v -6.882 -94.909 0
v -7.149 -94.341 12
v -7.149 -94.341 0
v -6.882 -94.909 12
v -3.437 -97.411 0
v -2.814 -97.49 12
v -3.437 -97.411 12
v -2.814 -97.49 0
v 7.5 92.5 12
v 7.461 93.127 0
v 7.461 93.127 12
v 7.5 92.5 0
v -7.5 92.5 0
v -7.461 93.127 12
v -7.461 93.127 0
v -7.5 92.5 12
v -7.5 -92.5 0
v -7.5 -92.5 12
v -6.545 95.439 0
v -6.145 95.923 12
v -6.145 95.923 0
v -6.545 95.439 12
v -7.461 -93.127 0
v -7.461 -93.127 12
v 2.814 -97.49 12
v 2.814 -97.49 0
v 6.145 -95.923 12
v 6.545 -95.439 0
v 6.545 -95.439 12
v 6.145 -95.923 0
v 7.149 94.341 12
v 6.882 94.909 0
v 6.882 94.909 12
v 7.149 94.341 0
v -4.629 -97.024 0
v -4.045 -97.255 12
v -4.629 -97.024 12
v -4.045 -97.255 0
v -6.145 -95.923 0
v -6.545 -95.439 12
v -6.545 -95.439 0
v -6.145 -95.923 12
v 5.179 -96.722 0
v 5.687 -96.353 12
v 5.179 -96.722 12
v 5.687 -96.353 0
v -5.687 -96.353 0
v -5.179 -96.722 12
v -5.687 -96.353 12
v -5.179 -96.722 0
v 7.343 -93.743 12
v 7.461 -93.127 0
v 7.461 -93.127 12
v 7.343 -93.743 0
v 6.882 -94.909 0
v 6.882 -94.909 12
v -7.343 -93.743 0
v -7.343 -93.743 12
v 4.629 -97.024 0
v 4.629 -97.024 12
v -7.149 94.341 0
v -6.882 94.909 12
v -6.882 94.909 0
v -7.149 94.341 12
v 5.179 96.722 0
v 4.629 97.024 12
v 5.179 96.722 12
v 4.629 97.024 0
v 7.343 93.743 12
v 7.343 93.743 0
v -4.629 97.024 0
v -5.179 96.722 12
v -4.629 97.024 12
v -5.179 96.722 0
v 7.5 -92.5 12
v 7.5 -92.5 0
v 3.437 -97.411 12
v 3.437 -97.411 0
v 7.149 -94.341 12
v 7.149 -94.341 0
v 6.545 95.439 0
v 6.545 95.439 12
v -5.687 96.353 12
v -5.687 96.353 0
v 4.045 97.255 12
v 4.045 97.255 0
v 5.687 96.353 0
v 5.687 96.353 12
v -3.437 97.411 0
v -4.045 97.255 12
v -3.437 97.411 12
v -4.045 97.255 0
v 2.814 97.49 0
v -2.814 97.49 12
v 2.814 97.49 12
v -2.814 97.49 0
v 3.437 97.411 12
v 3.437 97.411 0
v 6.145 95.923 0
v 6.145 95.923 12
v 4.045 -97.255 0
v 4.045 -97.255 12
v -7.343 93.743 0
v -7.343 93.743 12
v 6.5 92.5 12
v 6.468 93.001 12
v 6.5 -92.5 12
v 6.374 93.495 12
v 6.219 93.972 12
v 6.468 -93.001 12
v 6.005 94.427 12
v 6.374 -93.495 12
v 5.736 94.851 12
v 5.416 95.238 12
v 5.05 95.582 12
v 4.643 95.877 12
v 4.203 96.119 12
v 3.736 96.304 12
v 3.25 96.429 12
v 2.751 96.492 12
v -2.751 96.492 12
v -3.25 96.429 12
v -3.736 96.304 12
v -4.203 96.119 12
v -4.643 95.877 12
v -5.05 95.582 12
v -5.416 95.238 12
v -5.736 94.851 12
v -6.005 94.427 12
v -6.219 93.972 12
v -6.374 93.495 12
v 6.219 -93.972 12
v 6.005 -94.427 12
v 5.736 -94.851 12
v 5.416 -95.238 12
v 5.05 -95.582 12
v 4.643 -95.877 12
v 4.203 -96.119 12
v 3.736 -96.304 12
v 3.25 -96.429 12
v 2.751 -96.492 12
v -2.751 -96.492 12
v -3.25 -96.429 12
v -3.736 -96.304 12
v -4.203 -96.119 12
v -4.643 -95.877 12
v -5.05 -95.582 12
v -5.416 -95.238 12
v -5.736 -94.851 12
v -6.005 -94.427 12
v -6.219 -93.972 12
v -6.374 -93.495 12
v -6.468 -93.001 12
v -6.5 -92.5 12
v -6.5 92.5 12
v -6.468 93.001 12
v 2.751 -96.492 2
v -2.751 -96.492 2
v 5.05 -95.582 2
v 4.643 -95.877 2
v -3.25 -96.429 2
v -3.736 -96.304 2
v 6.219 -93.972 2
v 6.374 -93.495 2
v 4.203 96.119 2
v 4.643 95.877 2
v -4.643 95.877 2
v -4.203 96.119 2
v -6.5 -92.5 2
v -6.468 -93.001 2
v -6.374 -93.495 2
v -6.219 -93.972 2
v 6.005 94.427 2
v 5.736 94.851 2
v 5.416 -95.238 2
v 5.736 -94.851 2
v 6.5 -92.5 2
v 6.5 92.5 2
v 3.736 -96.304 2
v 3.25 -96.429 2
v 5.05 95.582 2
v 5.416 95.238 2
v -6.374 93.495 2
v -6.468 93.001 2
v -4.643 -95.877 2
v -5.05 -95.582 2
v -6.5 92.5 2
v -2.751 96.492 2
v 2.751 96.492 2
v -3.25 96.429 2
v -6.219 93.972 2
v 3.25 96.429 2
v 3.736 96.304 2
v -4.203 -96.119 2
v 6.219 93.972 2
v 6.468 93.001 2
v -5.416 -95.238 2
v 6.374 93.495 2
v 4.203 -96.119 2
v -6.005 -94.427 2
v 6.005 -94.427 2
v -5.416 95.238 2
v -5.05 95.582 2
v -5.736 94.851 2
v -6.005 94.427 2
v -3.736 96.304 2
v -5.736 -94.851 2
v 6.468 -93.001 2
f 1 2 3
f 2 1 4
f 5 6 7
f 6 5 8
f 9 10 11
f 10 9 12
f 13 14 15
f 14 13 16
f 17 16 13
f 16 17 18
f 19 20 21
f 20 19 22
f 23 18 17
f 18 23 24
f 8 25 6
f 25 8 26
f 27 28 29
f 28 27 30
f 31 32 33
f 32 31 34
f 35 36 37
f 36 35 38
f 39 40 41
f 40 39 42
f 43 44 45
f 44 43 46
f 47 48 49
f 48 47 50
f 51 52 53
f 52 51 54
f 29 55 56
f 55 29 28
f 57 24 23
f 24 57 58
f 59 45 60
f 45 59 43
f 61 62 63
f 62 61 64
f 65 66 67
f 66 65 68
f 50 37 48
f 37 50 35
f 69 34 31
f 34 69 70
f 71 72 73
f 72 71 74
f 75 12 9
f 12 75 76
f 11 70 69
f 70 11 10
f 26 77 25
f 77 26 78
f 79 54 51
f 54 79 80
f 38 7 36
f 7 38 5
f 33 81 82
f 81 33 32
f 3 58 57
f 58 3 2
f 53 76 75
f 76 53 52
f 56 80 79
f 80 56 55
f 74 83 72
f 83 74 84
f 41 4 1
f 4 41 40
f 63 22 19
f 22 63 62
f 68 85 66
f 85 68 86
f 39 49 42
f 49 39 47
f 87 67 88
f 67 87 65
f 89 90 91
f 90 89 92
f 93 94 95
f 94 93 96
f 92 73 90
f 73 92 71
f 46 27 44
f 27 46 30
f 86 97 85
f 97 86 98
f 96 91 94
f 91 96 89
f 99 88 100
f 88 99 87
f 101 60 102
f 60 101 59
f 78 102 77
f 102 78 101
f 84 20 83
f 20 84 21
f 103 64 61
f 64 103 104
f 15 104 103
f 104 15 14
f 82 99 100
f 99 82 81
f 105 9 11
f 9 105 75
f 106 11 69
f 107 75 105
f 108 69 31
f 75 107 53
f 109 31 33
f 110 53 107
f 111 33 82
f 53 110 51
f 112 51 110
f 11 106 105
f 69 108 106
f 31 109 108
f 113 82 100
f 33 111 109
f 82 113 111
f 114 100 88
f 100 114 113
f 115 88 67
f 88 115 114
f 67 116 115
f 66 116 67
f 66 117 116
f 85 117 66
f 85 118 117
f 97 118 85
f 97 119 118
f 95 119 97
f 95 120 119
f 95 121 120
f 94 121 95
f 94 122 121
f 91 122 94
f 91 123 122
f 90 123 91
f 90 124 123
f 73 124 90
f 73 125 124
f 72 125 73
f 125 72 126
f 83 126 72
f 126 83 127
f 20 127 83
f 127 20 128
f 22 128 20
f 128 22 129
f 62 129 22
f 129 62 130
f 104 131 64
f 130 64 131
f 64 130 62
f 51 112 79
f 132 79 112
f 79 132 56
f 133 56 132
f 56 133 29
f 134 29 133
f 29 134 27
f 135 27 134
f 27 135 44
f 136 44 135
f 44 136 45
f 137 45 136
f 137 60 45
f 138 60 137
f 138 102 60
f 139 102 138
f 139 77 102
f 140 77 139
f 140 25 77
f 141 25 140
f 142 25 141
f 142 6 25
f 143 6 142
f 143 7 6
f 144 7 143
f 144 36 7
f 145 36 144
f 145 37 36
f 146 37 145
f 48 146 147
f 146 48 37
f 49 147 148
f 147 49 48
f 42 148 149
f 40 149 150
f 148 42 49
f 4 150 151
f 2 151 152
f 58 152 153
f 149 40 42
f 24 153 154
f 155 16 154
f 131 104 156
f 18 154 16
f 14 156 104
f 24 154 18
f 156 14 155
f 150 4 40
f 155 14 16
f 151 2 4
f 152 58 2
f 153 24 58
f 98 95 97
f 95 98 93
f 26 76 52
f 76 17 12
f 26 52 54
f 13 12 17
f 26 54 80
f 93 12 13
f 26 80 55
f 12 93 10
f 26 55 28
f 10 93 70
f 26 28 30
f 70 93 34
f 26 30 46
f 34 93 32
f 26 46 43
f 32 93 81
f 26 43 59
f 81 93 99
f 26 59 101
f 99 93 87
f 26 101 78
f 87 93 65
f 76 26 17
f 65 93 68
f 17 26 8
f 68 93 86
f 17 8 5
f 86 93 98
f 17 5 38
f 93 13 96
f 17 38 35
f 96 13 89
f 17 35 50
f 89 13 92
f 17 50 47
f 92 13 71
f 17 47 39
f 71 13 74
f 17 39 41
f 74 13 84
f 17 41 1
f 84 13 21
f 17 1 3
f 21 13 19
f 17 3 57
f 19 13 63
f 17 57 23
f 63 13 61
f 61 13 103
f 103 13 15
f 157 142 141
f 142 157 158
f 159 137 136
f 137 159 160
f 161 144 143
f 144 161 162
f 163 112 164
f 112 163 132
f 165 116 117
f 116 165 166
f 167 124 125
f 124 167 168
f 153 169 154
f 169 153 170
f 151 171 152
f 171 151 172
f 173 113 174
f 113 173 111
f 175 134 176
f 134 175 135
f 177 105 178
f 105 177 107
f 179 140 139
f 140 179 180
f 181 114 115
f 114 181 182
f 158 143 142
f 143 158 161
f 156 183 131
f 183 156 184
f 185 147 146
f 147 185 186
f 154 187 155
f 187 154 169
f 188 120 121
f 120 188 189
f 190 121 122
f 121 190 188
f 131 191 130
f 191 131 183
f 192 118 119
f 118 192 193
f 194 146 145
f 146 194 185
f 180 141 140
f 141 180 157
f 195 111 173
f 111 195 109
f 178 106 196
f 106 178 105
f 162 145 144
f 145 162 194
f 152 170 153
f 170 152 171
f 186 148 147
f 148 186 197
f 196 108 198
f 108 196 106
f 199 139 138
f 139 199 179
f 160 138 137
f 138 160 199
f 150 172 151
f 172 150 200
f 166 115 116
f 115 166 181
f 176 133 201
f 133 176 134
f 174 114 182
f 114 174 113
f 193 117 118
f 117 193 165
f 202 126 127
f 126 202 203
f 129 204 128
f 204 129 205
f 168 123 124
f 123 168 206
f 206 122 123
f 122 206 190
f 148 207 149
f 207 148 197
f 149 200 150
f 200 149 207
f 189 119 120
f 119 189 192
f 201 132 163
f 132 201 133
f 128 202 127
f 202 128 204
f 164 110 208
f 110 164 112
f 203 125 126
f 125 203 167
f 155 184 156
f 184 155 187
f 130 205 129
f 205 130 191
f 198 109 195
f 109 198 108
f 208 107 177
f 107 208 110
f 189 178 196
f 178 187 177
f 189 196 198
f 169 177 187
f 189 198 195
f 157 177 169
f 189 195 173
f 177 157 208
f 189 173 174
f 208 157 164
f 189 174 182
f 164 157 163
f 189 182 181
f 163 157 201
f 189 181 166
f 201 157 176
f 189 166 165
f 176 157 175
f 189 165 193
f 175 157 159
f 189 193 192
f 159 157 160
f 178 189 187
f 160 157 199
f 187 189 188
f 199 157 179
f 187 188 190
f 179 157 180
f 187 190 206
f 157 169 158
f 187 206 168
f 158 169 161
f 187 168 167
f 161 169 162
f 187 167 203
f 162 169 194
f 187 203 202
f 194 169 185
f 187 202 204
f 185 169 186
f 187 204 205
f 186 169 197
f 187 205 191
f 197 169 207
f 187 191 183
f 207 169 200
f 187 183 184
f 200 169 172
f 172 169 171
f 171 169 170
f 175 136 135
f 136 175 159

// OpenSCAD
$fn = 50;


difference() {
	union() {
		hull() {
			translate(v = [-2.5000000000, 92.5000000000, 0]) {
				cylinder(h = 12, r = 5);
			}
			translate(v = [2.5000000000, 92.5000000000, 0]) {
				cylinder(h = 12, r = 5);
			}
			translate(v = [-2.5000000000, -92.5000000000, 0]) {
				cylinder(h = 12, r = 5);
			}
			translate(v = [2.5000000000, -92.5000000000, 0]) {
				cylinder(h = 12, r = 5);
			}
		}
	}
	union() {
		translate(v = [0, 0, 2]) {
			hull() {
				translate(v = [-2.5000000000, 92.5000000000, 0]) {
					cylinder(h = 10, r = 4);
				}
				translate(v = [2.5000000000, 92.5000000000, 0]) {
					cylinder(h = 10, r = 4);
				}
				translate(v = [-2.5000000000, -92.5000000000, 0]) {
					cylinder(h = 10, r = 4);
				}
				translate(v = [2.5000000000, -92.5000000000, 0]) {
					cylinder(h = 10, r = 4);
				}
			}
		}
	}
}
